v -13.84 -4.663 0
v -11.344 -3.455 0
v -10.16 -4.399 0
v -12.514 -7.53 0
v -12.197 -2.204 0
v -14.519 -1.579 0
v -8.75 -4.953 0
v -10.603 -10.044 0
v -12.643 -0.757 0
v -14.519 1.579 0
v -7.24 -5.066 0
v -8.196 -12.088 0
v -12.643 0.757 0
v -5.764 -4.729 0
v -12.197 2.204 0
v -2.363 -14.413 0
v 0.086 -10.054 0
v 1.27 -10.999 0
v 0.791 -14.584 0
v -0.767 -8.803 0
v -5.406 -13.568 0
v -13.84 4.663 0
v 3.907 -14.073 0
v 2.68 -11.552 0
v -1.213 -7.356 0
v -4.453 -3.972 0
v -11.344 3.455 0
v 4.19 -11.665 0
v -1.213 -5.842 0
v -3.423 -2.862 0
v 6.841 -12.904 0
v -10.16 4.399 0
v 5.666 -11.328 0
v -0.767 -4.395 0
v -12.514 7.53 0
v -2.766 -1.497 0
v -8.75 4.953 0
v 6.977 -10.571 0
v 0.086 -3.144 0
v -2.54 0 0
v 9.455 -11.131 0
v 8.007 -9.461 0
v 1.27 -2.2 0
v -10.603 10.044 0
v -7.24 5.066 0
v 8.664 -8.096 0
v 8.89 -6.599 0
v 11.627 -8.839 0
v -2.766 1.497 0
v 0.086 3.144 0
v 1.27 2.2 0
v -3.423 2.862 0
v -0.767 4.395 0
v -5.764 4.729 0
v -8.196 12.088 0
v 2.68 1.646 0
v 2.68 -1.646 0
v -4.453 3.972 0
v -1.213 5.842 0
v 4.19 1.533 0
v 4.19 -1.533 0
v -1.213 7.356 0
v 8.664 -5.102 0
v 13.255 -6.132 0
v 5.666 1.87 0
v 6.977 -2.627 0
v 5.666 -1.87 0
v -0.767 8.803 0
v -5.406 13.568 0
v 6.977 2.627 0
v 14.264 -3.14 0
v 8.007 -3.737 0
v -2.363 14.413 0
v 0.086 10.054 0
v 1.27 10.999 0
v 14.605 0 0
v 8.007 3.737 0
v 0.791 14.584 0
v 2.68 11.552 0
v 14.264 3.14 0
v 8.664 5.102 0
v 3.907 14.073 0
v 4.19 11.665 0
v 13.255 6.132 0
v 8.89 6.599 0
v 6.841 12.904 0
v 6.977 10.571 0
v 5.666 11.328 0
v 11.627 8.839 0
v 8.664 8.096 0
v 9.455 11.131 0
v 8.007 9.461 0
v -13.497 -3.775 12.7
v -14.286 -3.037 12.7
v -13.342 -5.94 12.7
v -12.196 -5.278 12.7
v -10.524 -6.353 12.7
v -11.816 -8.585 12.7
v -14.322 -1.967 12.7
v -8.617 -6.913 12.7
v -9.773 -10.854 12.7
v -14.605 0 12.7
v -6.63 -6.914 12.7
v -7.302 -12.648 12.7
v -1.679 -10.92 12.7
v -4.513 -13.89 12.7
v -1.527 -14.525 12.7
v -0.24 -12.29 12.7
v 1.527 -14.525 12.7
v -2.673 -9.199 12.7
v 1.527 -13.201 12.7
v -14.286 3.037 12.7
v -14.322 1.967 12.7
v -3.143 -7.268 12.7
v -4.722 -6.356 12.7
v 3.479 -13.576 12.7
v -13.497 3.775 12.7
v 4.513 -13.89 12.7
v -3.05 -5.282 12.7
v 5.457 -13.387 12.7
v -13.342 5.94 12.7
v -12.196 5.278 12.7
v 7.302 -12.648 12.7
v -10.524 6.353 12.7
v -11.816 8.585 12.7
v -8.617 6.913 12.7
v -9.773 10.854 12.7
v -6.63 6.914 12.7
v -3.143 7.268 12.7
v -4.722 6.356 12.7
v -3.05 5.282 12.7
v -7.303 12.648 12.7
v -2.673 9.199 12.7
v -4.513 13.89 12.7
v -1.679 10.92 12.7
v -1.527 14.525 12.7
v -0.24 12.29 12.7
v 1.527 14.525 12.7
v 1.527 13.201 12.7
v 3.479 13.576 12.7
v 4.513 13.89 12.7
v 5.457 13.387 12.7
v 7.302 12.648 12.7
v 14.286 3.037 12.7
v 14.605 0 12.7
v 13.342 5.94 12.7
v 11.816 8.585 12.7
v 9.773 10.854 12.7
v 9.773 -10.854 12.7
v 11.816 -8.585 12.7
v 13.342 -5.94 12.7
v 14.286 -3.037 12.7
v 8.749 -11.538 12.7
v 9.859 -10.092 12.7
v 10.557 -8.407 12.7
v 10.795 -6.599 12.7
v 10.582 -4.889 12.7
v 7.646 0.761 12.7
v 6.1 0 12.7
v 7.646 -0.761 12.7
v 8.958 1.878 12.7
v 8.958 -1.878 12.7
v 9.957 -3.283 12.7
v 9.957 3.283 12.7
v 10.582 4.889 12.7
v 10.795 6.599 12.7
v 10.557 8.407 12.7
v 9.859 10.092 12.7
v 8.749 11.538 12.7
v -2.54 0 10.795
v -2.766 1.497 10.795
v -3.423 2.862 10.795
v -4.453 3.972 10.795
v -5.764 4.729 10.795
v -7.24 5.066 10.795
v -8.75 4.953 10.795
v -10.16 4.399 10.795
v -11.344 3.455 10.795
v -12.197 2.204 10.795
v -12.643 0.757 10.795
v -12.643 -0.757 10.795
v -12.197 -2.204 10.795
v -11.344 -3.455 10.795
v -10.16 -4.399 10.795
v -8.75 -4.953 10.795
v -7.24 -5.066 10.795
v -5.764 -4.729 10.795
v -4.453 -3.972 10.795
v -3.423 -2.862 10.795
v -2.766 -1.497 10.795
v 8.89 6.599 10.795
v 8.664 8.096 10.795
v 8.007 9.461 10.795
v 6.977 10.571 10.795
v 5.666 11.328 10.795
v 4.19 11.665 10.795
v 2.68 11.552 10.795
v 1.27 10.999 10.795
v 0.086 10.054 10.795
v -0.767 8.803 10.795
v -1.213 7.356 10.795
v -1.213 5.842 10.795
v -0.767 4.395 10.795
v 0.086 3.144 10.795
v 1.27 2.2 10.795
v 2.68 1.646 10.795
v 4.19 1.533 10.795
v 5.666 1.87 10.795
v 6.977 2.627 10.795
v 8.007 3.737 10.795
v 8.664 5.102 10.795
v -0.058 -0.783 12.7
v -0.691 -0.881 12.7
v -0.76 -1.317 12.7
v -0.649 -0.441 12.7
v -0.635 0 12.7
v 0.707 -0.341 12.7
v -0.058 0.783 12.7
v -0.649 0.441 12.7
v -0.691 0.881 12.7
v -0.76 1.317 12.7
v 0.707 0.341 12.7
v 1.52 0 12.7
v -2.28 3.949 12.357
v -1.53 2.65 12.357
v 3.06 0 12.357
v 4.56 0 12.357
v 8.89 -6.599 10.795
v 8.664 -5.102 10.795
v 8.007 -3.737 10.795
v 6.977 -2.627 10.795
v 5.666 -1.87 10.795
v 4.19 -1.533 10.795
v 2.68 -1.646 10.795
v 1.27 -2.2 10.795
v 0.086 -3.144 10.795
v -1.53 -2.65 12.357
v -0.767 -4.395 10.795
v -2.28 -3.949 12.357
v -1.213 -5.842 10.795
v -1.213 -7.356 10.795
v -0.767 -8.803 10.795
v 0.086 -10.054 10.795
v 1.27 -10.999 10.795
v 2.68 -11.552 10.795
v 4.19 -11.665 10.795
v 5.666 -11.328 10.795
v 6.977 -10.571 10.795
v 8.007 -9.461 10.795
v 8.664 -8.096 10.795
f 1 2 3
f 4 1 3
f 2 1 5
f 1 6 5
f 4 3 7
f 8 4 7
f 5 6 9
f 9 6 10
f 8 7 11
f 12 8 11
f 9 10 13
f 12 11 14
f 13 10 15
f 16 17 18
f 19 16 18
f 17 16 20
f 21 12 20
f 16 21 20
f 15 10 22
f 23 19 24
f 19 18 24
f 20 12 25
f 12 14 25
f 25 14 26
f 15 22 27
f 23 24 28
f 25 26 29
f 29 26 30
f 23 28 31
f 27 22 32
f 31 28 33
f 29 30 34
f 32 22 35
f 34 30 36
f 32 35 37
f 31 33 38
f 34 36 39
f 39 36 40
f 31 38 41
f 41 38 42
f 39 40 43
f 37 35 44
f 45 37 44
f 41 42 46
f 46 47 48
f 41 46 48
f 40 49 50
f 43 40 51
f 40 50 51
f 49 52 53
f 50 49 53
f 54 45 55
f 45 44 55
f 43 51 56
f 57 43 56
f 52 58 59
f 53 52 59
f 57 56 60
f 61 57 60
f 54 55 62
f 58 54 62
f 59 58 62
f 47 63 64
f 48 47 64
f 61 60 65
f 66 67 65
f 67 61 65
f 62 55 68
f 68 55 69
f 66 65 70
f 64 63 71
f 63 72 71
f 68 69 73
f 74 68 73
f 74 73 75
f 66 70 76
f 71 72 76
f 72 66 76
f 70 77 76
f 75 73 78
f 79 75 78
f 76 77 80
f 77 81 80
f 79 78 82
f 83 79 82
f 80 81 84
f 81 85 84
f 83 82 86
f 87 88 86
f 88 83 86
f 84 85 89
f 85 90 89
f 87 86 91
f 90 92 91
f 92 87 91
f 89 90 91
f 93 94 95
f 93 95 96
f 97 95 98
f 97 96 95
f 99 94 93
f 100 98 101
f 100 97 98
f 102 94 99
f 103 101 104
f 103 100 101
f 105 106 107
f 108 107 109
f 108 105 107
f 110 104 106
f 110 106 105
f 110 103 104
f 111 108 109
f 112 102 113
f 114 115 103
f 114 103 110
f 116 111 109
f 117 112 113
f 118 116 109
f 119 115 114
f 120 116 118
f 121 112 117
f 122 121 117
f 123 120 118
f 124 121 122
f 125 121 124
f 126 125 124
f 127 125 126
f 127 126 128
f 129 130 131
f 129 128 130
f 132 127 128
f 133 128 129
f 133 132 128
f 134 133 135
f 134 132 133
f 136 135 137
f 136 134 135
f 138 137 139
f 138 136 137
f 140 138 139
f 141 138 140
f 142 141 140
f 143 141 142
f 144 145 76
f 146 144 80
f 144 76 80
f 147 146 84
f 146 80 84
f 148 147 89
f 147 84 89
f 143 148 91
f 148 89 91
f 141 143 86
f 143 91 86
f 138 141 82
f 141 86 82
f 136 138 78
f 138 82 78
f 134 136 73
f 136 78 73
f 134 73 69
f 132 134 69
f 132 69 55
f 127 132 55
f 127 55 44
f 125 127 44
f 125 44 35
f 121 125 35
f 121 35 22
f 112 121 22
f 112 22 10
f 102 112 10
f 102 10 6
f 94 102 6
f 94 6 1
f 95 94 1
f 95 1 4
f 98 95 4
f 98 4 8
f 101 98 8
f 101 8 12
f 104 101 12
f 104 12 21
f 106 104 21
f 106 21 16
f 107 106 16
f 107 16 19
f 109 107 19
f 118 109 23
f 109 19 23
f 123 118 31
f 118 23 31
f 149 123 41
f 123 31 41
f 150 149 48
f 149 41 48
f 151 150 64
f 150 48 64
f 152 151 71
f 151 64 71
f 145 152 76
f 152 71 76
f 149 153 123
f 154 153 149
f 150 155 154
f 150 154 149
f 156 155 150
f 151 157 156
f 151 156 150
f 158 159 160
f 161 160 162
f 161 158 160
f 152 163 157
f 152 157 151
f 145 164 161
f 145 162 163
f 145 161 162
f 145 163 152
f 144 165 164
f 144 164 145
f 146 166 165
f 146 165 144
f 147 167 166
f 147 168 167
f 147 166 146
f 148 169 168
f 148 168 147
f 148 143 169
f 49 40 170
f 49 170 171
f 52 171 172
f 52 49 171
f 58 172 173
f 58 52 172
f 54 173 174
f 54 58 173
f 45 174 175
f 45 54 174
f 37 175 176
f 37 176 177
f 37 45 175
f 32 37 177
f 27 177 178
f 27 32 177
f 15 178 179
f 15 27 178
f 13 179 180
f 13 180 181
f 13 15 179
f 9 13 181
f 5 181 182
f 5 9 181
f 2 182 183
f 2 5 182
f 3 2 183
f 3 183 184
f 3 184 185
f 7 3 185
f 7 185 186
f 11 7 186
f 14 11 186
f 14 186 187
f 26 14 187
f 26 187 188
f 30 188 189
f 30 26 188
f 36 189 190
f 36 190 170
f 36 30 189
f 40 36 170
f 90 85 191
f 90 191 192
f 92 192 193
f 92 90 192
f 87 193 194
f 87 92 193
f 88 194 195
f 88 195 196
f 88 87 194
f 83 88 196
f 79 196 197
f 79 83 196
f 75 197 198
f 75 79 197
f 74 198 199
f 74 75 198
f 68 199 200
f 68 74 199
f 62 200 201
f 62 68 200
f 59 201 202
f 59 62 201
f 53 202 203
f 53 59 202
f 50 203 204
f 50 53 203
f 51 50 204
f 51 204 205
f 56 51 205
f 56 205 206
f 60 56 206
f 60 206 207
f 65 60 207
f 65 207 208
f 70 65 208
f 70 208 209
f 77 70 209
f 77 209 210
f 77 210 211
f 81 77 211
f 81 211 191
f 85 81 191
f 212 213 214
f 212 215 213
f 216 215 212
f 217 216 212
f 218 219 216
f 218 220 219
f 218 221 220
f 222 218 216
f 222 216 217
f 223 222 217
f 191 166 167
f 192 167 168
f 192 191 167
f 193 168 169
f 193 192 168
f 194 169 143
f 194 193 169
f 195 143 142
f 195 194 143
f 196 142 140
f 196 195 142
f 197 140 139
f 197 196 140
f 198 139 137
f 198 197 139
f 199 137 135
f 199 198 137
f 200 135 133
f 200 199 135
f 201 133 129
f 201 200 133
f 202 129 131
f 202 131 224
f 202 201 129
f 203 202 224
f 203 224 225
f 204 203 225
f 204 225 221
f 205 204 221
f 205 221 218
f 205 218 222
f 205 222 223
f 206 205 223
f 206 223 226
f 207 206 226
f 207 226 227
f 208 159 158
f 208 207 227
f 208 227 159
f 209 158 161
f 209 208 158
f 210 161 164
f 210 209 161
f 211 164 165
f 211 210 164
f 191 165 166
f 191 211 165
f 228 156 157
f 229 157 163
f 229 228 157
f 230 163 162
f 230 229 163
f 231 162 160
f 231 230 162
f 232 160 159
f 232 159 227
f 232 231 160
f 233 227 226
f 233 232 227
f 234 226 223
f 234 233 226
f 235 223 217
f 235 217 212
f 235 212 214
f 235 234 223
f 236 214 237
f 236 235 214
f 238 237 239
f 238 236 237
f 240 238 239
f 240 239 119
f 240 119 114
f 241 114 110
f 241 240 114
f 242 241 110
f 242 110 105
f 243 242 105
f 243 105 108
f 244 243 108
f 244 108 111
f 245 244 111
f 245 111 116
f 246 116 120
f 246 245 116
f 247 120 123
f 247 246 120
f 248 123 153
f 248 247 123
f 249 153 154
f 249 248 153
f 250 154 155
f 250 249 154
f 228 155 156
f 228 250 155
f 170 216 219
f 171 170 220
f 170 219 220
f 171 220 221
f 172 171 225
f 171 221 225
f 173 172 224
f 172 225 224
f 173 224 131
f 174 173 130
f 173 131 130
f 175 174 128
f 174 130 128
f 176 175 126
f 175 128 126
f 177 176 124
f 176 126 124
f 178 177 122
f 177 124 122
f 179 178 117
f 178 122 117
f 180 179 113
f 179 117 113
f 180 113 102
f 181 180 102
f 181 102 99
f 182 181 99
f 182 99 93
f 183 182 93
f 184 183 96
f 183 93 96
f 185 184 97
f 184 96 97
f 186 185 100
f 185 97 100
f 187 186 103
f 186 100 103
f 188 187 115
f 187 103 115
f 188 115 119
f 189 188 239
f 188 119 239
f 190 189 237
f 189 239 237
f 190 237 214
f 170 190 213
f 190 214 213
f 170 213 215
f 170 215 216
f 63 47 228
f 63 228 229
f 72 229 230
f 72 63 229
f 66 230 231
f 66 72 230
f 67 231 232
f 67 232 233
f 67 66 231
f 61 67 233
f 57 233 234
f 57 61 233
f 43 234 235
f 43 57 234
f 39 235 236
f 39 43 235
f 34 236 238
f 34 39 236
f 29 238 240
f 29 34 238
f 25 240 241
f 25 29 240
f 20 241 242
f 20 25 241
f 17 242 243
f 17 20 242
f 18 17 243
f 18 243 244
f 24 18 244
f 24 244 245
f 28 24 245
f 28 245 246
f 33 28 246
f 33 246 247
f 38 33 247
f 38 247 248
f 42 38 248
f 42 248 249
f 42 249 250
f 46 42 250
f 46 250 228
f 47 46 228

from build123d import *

# Parameters (mm, degrees)
F0_R     = 14.605
F0_R_2   = 5.08
F1_DEPTH = 12.7
F2_SIZE  = 1.90499


# Not quite as in the source:
# - a fillet or chamfer that OpenCascade refuses, or shapes differently, is made with other operations: its cross-section is extruded or revolved along the edge and cut away or added
# - a fillet or chamfer is up to 0.001 mm smaller than in the source, because OpenCascade refuses the exact size


with BuildPart() as f1:
    # F0 (on Top) → F1 (new body)
    with BuildSketch(Plane.XY):
        Circle(F0_R)
        with Locations((-7.62, 0)):
            Circle(F0_R_2, mode=Mode.SUBTRACT)
        with Locations((3.81, -6.5991135768)):
            Circle(F0_R_2, mode=Mode.SUBTRACT)
        with Locations((3.81, 6.5991135768)):
            Circle(F0_R_2, mode=Mode.SUBTRACT)
    extrude(amount=F1_DEPTH)

    # F2 (size 1.905 in the source; OpenCascade refuses exactly that, so slightly less here)
    f2_edges = [f1.edges().sort_by_distance(p)[0] for p in [
        (-12.7, 0, 12.7),
    ]]
    chamfer(f2_edges, length=F2_SIZE)

    # F3: chamfer of 1.905 on 1 edges, made by hand

    # F3_s1 → F3_t2 (revolve, cut)
    with BuildSketch(Plane.XZ.offset(-6.5991135768)):
        Polygon((10.795, 12.7), (8.89, 10.795), (8.89, 12.7), align=None)
    revolve(axis=Axis((3.81, 6.5991135768, 12.7), (0, 0, 1)), mode=Mode.SUBTRACT)

    # F4: chamfer of 1.905 on 1 edges, made by hand

    # F4_s1 → F4_t2 (revolve, cut)
    with BuildSketch(Plane.XZ.offset(6.5991135768)):
        Polygon((10.795, 12.7), (8.89, 10.795), (8.89, 12.7), align=None)
    revolve(axis=Axis((3.81, -6.5991135768, 12.7), (0, 0, 1)), mode=Mode.SUBTRACT)


solid = f1.part
